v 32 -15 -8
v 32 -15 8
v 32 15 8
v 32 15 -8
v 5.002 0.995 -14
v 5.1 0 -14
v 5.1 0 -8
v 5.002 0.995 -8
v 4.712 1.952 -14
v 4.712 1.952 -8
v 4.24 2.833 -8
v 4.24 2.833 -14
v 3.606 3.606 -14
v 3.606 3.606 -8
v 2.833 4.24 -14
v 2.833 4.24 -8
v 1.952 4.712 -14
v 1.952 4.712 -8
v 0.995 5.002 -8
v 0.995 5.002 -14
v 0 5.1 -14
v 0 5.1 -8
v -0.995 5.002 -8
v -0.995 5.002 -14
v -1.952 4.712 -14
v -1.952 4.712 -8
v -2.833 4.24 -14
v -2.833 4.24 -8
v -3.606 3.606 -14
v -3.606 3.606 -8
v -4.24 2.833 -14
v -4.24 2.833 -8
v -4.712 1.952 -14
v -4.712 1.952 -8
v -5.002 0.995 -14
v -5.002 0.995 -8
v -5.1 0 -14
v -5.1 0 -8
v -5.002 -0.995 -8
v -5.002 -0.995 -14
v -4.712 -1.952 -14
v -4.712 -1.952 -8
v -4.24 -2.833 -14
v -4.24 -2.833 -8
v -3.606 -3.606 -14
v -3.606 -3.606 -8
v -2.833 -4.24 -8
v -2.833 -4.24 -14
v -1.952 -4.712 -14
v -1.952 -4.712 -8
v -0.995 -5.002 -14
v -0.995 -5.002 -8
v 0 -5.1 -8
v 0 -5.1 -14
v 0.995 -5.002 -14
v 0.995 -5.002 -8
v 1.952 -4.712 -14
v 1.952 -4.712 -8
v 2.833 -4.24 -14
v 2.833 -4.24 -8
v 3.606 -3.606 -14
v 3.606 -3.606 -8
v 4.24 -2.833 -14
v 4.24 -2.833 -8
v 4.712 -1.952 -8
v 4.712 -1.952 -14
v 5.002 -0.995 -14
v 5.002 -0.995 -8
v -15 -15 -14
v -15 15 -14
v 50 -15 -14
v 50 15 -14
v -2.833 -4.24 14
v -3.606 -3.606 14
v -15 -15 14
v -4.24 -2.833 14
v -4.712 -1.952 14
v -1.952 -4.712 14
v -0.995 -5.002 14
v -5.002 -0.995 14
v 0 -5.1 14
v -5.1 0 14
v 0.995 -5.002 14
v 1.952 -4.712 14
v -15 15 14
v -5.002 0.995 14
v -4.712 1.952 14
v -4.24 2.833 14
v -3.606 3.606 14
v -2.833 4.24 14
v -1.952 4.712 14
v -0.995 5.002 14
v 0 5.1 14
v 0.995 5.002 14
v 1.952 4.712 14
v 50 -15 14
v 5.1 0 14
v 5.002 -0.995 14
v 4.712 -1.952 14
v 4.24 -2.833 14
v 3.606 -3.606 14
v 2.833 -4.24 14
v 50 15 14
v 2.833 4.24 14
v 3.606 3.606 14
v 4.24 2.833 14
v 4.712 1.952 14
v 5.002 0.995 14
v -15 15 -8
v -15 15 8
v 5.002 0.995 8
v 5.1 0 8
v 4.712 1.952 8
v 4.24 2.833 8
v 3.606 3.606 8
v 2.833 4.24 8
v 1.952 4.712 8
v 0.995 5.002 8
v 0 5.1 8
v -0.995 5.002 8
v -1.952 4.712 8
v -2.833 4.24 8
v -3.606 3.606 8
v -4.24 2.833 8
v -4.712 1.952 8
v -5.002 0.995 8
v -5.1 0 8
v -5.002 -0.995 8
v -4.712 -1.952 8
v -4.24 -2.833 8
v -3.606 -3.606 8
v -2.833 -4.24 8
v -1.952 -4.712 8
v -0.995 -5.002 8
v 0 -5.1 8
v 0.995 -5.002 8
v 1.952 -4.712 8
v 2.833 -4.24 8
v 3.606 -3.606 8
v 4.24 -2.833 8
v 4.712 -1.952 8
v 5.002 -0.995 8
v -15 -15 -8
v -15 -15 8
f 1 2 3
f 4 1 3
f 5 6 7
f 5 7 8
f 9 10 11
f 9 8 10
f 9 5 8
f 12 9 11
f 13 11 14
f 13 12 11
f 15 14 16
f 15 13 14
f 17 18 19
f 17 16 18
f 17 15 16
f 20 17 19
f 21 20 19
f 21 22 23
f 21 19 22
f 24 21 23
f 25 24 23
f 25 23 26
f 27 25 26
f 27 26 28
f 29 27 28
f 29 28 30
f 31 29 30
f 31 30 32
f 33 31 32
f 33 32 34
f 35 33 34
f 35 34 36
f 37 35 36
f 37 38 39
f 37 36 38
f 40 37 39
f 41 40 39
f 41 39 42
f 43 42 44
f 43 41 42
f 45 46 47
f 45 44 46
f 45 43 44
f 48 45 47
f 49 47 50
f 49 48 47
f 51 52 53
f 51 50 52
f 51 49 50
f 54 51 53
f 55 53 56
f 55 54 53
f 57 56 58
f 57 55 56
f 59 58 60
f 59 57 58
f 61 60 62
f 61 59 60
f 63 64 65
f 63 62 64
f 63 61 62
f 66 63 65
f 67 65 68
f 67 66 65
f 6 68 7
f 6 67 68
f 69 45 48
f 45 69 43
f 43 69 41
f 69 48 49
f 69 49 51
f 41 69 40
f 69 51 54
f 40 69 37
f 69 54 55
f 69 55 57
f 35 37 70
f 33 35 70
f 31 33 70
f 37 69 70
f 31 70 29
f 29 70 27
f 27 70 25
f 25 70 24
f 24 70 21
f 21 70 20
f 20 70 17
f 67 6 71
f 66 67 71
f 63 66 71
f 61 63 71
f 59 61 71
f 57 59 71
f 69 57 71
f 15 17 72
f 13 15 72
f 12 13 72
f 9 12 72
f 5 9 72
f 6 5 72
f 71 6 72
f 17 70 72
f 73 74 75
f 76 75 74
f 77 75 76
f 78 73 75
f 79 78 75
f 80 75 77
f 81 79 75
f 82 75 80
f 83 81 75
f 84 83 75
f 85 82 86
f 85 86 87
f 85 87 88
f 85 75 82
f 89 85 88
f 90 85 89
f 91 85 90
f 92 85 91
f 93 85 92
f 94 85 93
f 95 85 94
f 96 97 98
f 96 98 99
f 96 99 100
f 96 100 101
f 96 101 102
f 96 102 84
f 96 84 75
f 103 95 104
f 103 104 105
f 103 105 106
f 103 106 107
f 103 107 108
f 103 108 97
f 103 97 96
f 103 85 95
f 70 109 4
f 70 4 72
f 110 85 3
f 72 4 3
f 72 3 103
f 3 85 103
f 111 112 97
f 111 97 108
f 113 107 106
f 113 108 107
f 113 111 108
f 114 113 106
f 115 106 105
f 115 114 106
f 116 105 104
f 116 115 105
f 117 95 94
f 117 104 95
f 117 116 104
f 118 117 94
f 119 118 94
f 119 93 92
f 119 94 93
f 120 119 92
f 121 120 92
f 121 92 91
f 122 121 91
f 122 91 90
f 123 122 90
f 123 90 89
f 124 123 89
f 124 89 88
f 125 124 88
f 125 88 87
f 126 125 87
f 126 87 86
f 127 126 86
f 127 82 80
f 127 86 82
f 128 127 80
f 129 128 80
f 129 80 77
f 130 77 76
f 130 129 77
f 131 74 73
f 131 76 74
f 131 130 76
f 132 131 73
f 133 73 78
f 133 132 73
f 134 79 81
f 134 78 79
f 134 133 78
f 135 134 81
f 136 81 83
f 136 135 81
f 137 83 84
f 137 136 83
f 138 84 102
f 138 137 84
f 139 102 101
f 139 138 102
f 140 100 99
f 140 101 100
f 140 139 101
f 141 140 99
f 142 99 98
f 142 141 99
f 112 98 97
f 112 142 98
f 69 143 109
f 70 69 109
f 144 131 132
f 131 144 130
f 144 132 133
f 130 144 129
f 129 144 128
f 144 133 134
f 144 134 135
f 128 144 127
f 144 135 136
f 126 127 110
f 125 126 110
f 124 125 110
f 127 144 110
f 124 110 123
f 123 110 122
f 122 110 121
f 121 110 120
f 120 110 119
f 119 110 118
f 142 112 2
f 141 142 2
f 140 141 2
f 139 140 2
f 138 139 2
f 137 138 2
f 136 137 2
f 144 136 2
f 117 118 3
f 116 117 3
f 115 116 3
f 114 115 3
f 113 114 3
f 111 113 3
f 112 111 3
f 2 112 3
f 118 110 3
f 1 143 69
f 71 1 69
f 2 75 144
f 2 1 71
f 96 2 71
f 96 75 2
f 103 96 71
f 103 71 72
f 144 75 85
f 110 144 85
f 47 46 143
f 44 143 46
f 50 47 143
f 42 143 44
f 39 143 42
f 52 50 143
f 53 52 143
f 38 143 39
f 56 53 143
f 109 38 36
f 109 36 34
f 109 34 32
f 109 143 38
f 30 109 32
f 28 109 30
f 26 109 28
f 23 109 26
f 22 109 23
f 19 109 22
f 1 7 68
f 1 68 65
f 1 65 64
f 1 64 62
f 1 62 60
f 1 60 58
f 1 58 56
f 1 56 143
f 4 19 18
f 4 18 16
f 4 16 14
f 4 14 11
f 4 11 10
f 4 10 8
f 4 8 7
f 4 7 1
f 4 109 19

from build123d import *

# Parameters (mm, degrees)
SKETCH1_W               = 65
SKETCH1_H               = 30
BOSS_EXTRUDE1_DEPTH     = 14
SKETCH2_W               = 48
SKETCH2_H               = 32
CUT_EXTRUDE1_DEPTH      = 8
CUT_EXTRUDE2_DEPTH      = 55.046276467
CUT_EXTRUDE2_DEPTH_BACK = 55.046276467
SKETCH3_R               = 5.1


with BuildPart() as part:
    # Sketch1 → Boss-Extrude1 (new, symmetric)
    with BuildSketch(Plane.XY):
        with Locations((17.5, 0)):
            Rectangle(SKETCH1_W, SKETCH1_H)
    extrude(amount=BOSS_EXTRUDE1_DEPTH, both=True)

    # Sketch2 → Cut-Extrude1 (cut, symmetric)
    with BuildSketch(Plane.XY):
        with Locations((8, 0)):
            Rectangle(SKETCH2_W, SKETCH2_H)
    extrude(amount=CUT_EXTRUDE1_DEPTH, both=True, mode=Mode.SUBTRACT)

    # Sketch3 → Cut-Extrude2 (cut, two sides: drawn at the far end of the back side and taken through both)
    with BuildSketch(Plane.XY.offset(-CUT_EXTRUDE2_DEPTH_BACK)):
        Circle(SKETCH3_R)
    extrude(amount=CUT_EXTRUDE2_DEPTH + CUT_EXTRUDE2_DEPTH_BACK, mode=Mode.SUBTRACT)


solid = part.part
